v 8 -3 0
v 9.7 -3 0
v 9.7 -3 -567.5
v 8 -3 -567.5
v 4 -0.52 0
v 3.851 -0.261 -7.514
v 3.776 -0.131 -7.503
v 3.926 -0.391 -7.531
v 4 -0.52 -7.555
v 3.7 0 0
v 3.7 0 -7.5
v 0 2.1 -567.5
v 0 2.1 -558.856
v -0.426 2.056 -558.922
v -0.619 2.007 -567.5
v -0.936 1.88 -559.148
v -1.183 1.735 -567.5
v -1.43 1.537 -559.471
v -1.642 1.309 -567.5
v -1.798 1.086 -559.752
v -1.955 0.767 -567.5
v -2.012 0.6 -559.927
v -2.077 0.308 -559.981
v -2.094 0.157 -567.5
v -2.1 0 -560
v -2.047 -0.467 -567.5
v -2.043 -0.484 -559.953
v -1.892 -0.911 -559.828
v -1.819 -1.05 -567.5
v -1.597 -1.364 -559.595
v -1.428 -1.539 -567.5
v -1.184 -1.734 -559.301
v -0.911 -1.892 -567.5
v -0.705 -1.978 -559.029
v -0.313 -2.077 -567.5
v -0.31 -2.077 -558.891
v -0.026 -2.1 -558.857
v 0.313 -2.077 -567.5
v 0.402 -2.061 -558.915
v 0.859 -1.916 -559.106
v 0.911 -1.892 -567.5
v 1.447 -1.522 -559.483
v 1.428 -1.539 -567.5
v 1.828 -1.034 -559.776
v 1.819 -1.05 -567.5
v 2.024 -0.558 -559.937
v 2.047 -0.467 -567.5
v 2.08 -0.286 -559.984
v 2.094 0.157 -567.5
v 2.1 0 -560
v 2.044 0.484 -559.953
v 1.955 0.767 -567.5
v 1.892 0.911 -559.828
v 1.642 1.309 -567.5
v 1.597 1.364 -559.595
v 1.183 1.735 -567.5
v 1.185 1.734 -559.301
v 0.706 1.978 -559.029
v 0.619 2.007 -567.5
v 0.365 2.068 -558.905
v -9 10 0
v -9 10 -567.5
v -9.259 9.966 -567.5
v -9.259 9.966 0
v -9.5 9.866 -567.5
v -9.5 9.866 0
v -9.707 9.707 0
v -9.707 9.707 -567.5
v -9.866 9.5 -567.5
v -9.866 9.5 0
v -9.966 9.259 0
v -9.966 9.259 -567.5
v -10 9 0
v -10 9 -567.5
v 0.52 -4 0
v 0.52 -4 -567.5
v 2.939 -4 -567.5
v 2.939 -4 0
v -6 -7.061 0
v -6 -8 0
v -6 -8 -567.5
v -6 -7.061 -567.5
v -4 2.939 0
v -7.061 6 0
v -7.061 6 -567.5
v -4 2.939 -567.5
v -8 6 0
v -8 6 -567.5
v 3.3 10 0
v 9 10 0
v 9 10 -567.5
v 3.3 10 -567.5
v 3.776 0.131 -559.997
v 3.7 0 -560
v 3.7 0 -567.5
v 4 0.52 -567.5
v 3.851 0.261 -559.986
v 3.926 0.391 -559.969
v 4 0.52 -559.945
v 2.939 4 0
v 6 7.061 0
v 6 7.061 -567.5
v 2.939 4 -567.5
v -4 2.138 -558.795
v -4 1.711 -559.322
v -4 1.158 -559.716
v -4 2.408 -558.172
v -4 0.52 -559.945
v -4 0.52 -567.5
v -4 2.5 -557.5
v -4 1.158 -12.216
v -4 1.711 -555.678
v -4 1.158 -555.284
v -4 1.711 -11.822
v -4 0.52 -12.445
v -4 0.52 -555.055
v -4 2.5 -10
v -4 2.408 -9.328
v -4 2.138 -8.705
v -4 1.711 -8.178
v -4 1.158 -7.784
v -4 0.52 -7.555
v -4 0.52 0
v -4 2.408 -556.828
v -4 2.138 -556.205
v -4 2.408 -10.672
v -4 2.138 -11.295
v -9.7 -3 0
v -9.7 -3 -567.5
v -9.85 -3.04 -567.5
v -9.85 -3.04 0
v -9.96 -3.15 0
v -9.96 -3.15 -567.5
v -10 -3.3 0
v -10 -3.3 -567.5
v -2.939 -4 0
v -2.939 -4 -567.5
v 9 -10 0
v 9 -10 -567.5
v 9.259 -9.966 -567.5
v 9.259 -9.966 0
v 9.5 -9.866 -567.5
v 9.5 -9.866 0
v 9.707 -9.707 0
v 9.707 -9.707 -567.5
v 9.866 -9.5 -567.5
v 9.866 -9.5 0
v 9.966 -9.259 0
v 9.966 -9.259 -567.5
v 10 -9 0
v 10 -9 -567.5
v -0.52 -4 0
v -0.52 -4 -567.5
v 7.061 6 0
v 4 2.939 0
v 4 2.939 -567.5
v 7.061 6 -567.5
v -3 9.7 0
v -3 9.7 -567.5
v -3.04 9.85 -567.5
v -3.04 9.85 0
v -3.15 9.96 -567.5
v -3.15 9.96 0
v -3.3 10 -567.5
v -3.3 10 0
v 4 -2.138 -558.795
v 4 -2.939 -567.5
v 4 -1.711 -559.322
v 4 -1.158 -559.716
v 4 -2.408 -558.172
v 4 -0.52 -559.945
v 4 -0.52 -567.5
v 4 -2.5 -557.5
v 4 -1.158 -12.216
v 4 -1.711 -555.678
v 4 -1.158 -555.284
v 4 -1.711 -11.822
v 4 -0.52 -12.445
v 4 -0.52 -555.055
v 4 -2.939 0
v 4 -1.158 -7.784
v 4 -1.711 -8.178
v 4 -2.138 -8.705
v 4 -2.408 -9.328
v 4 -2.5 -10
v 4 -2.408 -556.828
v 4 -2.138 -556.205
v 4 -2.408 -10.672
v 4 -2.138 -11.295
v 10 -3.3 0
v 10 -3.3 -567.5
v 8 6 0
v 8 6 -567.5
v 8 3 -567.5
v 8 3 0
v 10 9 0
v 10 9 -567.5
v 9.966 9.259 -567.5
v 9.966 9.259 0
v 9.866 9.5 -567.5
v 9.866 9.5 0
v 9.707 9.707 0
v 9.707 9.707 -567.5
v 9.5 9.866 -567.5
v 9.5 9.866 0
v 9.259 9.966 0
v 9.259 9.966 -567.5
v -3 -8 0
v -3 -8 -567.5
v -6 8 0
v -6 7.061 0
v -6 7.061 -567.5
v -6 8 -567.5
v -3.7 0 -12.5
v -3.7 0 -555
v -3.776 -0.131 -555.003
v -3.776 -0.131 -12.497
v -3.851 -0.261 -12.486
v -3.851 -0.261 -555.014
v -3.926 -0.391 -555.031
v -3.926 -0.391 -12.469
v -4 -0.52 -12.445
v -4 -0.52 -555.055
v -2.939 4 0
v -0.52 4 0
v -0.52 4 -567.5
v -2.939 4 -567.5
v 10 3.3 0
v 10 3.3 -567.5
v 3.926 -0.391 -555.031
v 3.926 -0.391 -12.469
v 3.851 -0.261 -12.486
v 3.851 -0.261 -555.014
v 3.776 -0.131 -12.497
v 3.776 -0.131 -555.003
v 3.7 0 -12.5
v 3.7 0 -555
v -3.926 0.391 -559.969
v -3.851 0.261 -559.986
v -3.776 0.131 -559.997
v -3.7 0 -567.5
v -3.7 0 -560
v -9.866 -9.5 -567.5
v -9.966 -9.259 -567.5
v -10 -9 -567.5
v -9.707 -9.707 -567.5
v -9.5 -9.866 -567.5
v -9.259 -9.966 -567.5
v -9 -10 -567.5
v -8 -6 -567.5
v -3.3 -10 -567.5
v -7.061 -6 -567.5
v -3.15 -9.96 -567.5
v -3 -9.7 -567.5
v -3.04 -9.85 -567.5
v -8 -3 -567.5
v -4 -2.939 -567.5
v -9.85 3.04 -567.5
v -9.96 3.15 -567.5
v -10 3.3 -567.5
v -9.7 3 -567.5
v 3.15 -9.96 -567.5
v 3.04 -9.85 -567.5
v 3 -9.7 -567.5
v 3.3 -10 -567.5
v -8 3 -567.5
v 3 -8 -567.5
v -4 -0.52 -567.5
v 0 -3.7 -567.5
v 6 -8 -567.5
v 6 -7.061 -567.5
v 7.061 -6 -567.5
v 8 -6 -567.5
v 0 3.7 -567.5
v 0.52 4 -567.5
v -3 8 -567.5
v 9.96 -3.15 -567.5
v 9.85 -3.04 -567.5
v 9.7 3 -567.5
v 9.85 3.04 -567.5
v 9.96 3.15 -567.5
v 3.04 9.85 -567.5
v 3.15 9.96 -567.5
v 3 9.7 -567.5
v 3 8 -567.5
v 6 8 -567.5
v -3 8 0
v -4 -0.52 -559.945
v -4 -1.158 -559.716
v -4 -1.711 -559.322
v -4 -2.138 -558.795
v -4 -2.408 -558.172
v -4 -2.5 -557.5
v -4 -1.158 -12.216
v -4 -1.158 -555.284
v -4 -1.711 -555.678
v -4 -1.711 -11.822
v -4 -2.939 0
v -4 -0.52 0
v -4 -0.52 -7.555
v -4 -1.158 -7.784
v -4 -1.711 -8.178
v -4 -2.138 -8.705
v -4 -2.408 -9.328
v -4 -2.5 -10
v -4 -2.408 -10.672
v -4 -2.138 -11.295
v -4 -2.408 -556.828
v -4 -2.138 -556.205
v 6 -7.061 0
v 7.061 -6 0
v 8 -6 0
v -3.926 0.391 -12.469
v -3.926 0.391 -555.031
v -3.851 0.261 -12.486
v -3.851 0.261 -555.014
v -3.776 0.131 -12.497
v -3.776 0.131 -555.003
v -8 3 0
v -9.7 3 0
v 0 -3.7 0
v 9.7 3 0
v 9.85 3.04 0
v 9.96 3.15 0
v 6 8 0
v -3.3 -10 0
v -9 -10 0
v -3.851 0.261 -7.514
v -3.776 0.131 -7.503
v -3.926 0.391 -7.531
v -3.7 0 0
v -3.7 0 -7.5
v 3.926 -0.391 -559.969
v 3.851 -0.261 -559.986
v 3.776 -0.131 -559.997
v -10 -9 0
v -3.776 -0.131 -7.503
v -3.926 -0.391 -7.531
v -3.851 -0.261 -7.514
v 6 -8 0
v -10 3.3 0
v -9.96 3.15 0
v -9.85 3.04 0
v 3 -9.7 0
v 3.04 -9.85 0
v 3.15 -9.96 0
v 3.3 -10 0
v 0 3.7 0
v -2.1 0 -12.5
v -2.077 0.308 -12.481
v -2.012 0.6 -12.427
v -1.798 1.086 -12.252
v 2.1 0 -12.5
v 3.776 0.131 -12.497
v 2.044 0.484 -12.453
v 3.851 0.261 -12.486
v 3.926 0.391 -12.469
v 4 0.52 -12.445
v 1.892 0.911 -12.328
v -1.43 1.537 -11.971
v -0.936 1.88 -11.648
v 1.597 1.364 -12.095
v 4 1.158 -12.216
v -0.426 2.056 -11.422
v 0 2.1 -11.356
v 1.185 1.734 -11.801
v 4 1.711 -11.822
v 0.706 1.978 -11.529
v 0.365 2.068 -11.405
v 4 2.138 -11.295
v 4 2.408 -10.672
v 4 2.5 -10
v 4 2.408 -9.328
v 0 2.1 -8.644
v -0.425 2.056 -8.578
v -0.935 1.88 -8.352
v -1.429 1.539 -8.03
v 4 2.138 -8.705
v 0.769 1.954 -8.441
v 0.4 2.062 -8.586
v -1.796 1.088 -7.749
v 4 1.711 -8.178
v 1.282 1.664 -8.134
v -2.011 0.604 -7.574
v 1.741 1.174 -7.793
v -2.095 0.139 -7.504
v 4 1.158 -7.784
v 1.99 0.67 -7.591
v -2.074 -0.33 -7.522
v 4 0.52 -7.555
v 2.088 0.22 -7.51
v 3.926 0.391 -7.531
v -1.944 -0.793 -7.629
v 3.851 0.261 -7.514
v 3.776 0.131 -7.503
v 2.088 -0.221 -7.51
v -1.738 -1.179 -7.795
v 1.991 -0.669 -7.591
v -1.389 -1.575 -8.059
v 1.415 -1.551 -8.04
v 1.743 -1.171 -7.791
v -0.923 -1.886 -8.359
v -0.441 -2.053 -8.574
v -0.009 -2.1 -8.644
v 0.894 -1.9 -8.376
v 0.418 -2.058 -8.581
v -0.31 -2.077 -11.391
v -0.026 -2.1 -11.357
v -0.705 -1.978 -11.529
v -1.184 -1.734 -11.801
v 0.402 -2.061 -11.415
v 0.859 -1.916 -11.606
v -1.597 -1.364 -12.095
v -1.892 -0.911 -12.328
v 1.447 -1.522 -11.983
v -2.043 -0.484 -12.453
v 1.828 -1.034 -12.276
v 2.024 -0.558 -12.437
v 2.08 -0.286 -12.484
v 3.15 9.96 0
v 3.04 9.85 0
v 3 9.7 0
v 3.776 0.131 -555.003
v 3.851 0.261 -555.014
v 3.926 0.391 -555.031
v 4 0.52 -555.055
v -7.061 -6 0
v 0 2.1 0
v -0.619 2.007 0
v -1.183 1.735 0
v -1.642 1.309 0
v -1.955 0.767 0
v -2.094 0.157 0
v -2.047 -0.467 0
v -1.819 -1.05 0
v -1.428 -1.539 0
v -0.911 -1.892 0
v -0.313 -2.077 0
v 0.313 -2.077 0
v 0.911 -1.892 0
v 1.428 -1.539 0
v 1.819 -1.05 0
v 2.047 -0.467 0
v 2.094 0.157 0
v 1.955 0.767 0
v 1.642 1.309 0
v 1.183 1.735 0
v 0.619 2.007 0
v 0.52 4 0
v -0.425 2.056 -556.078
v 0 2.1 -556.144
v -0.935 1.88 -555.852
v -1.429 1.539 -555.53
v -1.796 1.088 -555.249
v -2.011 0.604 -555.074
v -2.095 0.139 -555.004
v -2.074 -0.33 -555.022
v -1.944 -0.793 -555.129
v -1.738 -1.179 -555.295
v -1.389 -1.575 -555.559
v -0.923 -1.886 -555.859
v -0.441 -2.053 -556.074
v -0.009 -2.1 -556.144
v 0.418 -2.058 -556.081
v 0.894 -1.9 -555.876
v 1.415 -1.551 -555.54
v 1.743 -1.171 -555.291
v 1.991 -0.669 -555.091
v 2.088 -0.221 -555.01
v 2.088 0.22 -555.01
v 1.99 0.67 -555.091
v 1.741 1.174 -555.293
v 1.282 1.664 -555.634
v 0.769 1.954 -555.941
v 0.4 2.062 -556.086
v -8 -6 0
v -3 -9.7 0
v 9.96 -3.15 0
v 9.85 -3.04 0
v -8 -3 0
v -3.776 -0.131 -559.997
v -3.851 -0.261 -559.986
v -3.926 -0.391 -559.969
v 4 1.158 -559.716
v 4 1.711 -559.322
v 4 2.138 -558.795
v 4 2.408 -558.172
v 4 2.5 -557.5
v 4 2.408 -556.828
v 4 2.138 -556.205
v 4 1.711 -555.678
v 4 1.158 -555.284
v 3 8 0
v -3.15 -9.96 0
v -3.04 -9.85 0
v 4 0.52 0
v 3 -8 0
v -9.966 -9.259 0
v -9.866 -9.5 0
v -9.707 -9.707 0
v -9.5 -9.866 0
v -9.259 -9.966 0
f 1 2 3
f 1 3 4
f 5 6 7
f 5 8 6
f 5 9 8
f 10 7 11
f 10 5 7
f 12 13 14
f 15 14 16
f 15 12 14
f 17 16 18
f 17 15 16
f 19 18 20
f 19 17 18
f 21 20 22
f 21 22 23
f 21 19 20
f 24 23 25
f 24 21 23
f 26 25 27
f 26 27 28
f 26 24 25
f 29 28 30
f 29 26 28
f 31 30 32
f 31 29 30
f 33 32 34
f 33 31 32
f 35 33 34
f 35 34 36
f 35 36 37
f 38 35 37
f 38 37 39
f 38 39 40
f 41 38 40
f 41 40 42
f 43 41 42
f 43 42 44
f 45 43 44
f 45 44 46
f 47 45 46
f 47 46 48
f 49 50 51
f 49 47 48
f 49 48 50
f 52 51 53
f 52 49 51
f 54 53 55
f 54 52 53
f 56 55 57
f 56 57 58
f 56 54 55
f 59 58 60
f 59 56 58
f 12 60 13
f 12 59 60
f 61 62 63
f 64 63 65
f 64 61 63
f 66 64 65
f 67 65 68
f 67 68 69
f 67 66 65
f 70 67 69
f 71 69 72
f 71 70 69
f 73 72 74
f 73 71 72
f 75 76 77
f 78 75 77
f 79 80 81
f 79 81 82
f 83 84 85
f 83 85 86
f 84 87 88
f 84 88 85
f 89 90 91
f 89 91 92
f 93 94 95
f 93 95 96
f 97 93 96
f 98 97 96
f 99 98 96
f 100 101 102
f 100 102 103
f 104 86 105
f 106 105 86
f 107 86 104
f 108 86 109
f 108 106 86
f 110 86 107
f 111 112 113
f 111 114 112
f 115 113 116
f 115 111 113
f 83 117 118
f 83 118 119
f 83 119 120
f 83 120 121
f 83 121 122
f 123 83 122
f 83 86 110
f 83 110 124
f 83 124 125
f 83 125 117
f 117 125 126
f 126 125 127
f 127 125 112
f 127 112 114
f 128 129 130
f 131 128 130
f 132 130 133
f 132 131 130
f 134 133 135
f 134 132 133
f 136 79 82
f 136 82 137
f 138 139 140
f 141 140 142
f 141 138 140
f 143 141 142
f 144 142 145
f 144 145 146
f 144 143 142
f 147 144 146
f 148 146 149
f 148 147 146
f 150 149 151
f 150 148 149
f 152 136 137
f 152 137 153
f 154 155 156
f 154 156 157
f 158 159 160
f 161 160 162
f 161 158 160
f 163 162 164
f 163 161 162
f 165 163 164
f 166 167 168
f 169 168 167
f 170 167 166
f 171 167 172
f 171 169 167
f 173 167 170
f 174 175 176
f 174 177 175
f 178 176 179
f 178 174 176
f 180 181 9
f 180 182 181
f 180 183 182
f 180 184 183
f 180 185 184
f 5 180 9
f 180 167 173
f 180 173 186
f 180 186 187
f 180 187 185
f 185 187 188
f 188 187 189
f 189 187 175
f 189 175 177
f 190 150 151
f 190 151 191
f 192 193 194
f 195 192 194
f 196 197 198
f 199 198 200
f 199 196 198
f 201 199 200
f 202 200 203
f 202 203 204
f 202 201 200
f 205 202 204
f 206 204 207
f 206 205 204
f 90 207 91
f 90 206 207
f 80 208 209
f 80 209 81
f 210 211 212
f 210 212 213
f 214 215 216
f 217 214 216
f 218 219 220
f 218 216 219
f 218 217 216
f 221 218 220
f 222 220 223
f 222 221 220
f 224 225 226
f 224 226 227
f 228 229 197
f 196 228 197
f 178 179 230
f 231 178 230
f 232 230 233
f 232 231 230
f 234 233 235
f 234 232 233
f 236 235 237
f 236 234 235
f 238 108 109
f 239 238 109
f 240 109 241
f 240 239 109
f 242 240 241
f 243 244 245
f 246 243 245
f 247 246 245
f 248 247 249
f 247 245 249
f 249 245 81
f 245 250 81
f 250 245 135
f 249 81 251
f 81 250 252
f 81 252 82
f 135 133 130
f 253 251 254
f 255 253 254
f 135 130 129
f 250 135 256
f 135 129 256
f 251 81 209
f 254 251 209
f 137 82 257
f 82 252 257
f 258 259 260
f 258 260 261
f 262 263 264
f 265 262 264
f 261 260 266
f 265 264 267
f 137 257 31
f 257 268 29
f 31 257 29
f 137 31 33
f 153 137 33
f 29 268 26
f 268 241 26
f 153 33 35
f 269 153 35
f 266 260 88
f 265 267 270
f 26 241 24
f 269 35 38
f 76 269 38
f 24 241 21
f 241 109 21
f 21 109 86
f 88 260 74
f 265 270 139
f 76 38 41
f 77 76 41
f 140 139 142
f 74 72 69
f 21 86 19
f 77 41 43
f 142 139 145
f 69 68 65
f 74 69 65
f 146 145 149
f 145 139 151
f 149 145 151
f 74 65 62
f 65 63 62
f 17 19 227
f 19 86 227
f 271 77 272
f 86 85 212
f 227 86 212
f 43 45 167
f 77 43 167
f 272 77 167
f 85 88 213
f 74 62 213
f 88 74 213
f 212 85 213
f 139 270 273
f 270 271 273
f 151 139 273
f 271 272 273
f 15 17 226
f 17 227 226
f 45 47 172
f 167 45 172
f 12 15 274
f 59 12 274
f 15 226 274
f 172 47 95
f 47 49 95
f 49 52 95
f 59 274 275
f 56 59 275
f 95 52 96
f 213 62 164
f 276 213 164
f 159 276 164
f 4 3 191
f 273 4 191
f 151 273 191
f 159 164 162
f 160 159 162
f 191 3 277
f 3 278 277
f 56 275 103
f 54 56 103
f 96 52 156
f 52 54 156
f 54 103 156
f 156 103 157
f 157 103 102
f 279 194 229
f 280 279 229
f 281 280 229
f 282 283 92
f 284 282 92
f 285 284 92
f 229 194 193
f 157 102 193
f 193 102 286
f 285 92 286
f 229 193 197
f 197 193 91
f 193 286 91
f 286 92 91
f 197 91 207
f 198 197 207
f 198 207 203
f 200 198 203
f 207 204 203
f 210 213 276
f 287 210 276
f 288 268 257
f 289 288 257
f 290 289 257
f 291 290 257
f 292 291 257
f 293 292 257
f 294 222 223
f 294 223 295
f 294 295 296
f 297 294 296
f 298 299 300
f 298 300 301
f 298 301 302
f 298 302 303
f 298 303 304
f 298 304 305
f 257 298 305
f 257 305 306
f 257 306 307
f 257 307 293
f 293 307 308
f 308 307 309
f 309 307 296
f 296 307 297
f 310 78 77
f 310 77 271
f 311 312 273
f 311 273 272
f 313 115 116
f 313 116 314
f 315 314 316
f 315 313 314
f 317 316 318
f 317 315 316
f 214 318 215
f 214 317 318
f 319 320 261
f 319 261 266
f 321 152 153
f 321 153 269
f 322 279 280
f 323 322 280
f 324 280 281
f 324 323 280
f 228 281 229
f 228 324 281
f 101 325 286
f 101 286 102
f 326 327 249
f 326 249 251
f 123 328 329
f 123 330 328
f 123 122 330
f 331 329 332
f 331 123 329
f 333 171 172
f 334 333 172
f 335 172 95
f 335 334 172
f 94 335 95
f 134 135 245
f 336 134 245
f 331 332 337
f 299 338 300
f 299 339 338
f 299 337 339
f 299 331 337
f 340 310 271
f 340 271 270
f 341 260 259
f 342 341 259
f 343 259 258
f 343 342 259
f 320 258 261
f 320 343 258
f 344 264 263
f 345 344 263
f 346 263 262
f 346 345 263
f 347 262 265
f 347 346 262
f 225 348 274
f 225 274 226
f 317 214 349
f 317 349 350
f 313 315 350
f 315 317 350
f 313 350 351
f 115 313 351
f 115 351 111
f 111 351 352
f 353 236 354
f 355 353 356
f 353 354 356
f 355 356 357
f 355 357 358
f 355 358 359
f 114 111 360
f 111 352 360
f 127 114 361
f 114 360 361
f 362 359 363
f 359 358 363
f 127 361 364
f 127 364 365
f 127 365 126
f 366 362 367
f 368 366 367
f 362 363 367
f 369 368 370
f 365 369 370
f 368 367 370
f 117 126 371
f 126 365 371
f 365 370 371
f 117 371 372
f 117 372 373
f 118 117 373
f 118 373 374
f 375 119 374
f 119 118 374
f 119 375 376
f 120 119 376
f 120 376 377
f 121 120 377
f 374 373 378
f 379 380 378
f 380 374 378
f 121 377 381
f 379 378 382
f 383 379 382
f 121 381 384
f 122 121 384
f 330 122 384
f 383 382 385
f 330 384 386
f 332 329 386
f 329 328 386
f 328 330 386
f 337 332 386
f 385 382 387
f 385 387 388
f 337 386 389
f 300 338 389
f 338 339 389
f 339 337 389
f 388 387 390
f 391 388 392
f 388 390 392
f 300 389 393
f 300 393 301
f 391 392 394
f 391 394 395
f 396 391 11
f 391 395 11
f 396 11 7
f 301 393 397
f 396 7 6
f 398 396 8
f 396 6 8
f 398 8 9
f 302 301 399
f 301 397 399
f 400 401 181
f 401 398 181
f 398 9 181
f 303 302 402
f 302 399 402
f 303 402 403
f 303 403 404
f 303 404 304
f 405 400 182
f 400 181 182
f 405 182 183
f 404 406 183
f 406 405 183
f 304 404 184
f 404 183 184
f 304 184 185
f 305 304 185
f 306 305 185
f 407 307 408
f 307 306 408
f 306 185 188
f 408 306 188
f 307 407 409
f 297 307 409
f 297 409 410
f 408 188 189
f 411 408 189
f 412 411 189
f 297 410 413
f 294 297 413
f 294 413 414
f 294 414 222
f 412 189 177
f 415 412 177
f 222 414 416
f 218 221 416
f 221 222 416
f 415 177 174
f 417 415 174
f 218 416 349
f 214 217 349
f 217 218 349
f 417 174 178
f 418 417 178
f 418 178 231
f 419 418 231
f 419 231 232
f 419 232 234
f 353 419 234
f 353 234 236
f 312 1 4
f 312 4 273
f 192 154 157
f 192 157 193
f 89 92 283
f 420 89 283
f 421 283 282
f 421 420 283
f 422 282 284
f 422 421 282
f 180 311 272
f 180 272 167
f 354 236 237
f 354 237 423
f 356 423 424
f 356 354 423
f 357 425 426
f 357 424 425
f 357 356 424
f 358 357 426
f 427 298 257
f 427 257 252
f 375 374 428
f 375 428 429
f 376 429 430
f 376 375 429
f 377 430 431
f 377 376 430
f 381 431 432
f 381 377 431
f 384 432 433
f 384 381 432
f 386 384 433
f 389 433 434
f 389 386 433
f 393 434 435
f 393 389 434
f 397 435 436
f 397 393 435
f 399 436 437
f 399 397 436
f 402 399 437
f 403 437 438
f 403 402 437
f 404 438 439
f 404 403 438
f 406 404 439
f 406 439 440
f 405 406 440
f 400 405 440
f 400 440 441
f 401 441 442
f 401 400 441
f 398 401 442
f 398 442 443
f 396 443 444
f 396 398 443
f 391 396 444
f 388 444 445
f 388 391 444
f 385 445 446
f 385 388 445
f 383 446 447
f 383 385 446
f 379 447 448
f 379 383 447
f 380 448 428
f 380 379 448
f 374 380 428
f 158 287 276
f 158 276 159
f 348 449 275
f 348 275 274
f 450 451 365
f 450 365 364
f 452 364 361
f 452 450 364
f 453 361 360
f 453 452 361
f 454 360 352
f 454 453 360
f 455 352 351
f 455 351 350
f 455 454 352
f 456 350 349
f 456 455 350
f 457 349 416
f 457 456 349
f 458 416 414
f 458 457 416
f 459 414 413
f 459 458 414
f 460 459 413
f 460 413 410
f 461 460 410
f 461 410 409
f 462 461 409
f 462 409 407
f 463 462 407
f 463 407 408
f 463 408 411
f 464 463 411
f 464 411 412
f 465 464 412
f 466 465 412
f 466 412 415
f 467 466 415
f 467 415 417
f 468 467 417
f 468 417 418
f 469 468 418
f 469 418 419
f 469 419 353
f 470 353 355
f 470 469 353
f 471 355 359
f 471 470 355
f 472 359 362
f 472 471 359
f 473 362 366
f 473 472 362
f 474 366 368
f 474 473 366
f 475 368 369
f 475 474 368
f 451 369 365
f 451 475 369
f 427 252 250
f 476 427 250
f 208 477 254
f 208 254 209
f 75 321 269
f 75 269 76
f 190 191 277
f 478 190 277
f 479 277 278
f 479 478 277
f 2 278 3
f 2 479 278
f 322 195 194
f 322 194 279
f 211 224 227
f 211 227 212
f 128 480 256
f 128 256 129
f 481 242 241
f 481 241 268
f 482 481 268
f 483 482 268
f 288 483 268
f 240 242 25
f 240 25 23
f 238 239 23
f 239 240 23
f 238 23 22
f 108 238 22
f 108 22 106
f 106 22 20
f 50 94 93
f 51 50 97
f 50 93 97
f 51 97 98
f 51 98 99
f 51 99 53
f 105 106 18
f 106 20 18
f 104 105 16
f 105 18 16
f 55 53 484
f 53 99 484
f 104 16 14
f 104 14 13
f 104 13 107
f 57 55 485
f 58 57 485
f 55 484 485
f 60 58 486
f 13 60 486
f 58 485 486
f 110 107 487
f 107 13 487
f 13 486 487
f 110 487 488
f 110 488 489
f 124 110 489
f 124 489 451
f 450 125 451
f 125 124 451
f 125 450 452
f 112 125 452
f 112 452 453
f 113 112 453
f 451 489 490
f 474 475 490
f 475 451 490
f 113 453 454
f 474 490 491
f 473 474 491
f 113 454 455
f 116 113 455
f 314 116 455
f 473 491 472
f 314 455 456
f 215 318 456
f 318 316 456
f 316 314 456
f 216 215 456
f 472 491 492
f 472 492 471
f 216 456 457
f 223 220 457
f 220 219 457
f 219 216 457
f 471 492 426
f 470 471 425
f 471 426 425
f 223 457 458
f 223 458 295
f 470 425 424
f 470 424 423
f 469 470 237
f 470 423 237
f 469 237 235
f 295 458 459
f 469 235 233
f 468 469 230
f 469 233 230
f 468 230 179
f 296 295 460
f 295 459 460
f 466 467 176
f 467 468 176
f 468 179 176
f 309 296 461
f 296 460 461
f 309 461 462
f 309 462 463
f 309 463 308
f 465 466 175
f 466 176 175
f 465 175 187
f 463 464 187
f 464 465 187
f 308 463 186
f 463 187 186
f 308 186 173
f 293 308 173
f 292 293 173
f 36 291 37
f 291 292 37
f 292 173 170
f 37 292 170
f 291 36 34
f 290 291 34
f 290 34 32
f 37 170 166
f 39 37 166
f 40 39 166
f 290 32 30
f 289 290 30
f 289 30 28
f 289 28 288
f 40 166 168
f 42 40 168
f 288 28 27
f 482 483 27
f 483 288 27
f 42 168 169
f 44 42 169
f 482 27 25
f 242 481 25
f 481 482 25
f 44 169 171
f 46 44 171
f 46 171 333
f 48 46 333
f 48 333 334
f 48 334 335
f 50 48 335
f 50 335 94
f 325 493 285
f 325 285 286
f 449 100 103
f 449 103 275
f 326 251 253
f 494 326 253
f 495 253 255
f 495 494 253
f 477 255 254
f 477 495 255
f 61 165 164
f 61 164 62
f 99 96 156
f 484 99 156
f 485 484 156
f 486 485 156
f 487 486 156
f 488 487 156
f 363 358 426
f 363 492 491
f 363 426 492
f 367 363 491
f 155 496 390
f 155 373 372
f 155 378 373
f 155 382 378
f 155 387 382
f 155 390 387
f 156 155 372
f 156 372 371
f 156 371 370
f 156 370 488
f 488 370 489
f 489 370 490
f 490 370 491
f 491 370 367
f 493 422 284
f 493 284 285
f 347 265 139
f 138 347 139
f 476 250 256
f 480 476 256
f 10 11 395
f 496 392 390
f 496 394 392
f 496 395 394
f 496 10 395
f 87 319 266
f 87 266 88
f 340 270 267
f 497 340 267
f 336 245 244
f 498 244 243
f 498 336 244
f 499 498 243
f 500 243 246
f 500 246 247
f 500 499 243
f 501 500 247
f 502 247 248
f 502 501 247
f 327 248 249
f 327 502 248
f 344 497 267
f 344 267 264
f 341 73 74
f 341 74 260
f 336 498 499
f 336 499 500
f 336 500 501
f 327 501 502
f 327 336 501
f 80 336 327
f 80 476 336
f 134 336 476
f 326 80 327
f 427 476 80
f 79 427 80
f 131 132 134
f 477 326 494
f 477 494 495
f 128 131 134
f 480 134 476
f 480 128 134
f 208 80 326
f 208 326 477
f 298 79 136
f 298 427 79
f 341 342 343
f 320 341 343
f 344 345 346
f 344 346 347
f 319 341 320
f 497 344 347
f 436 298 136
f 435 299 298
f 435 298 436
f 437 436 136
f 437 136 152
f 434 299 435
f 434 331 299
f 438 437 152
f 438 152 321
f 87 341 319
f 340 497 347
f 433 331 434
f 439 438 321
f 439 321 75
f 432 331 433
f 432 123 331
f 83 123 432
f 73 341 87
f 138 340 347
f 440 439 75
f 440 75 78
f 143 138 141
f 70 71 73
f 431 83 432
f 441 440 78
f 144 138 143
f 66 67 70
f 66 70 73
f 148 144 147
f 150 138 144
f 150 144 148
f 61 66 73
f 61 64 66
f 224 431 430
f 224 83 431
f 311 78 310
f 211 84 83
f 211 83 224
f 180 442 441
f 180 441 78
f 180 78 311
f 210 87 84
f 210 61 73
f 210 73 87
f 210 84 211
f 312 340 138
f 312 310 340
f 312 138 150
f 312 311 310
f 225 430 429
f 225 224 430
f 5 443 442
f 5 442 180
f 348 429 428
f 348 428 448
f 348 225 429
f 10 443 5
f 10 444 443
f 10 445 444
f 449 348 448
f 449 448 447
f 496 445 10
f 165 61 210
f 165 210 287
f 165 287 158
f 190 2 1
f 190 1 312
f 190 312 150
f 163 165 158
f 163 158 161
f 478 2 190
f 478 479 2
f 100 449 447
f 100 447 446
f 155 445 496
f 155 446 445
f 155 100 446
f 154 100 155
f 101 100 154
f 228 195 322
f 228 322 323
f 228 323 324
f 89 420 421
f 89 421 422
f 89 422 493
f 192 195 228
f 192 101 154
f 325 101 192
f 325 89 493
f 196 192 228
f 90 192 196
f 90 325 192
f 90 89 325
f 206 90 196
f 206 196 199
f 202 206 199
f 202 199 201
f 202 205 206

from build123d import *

# Parameters (mm, degrees)
BOSS_EXTRUDE1_DEPTH = 567.5
SKETCH2_W           = 567.5
SKETCH2_H           = 2.1
SKETCH4_R           = 2.5
CUT_EXTRUDE1_DEPTH  = 8


with BuildPart() as part:
    # Sketch1 → Boss-Extrude1 (new body)
    with BuildSketch(Plane.XY):
        with BuildLine():
            Line((-10, 9), (-10, 3.29999995))
            ThreePointArc((-10, 3.29999995), (-9.912132049, 3.087867916), (-9.7, 3))
            Line((-9.7, 3), (-8, 3))
            Line((-8, 3), (-8, 6))
            Line((-8, 6), (-7.060677, 6))
            Line((-7.060677, 6), (-4, 2.93932965))
            Line((-4, 2.93932965), (-4, 0.519615242))
            Line((-4, 0.519615242), (-3.699996283, -6.437e-06))
            Line((-3.699996283, -6.437e-06), (-4, -0.519628117))
            Line((-4, -0.519628117), (-4, -2.93933725))
            Line((-4, -2.93933725), (-7.0606695, -6))
            Line((-7.0606695, -6), (-8, -6))
            Line((-8, -6), (-8, -3))
            Line((-8, -3), (-9.7, -3))
            ThreePointArc((-9.7, -3), (-9.912132049, -3.087867916), (-10, -3.29999995))
            Line((-10, -3.29999995), (-10, -9))
            ThreePointArc((-10, -9), (-9.707106781, -9.707106781), (-9, -10))
            Line((-9, -10), (-3.29999995, -10))
            ThreePointArc((-3.29999995, -10), (-3.087867916, -9.912132049), (-3, -9.7))
            Line((-3, -9.7), (-3, -8))
            Line((-3, -8), (-6, -8))
            Line((-6, -8), (-6, -7.0606515))
            Line((-6, -7.0606515), (-2.9393489, -4))
            Line((-2.9393489, -4), (-0.519615242, -4))
            Line((-0.519615242, -4), (6.437e-06, -3.699996283))
            Line((6.437e-06, -3.699996283), (0.519628117, -4))
            Line((0.519628117, -4), (2.9393227, -4))
            Line((2.9393227, -4), (6, -7.060677))
            Line((6, -7.060677), (6, -8))
            Line((6, -8), (3, -8))
            Line((3, -8), (3, -9.7))
            ThreePointArc((3, -9.7), (3.087867916, -9.912132049), (3.29999995, -10))
            Line((3.29999995, -10), (9, -10))
            ThreePointArc((9, -10), (9.707106781, -9.707106781), (10, -9))
            Line((10, -9), (10, -3.29999995))
            ThreePointArc((10, -3.29999995), (9.912132049, -3.087867916), (9.7, -3))
            Line((9.7, -3), (8, -3))
            Line((8, -3), (8, -6))
            Line((8, -6), (7.0606435, -6))
            Line((7.0606435, -6), (4, -2.9393482))
            Line((4, -2.9393482), (4, -0.519615242))
            Line((4, -0.519615242), (3.699996283, 6.437e-06))
            Line((3.699996283, 6.437e-06), (4, 0.519628117))
            Line((4, 0.519628117), (4, 2.9393401))
            Line((4, 2.9393401), (7.060651, 6))
            Line((7.060651, 6), (8, 6))
            Line((8, 6), (8, 3))
            Line((8, 3), (9.7, 3))
            ThreePointArc((9.7, 3), (9.912132049, 3.087867916), (10, 3.29999995))
            Line((10, 3.29999995), (10, 9))
            ThreePointArc((10, 9), (9.707106781, 9.707106781), (9, 10))
            Line((9, 10), (3.29999995, 10))
            ThreePointArc((3.29999995, 10), (3.087867916, 9.912132049), (3, 9.7))
            Line((3, 9.7), (3, 8))
            Line((3, 8), (6, 8))
            Line((6, 8), (6, 7.060669))
            Line((6, 7.060669), (2.9393308, 4))
            Line((2.9393308, 4), (0.519615242, 4))
            Line((0.519615242, 4), (-6.437e-06, 3.699996283))
            Line((-6.437e-06, 3.699996283), (-0.519628117, 4))
            Line((-0.519628117, 4), (-2.93935655, 4))
            Line((-2.93935655, 4), (-6, 7.0606435))
            Line((-6, 7.0606435), (-6, 8))
            Line((-6, 8), (-3, 8))
            Line((-3, 8), (-3, 9.7))
            ThreePointArc((-3, 9.7), (-3.087867966, 9.912132034), (-3.3, 10))
            Line((-3.3, 10), (-9, 10))
            ThreePointArc((-9, 10), (-9.707106781, 9.707106781), (-10, 9))
        make_face()
    extrude(amount=-BOSS_EXTRUDE1_DEPTH)

    # Sketch2 → Cut-Revolve1 (revolve, cut)
    with BuildSketch(Plane(origin=(0, 0, 0), x_dir=(0, 0, -1), z_dir=(1, 0, 0))):
        with Locations((283.75, 1.05)):
            Rectangle(SKETCH2_W, SKETCH2_H)
    revolve(axis=Axis((0, 0, -567.5), (0, 0, 1)), mode=Mode.SUBTRACT)

    # Sketch4 → Cut-Extrude1 (cut)
    with BuildSketch(Plane(origin=(4, 0, 0), x_dir=(0, 0, -1), z_dir=(1, 0, 0))):
        with Locations((10, 6.437e-06)):
            Circle(SKETCH4_R)
        with Locations((557.5, 6.437e-06)):
            Circle(SKETCH4_R)
    extrude(amount=-CUT_EXTRUDE1_DEPTH, mode=Mode.SUBTRACT)


solid = part.part
